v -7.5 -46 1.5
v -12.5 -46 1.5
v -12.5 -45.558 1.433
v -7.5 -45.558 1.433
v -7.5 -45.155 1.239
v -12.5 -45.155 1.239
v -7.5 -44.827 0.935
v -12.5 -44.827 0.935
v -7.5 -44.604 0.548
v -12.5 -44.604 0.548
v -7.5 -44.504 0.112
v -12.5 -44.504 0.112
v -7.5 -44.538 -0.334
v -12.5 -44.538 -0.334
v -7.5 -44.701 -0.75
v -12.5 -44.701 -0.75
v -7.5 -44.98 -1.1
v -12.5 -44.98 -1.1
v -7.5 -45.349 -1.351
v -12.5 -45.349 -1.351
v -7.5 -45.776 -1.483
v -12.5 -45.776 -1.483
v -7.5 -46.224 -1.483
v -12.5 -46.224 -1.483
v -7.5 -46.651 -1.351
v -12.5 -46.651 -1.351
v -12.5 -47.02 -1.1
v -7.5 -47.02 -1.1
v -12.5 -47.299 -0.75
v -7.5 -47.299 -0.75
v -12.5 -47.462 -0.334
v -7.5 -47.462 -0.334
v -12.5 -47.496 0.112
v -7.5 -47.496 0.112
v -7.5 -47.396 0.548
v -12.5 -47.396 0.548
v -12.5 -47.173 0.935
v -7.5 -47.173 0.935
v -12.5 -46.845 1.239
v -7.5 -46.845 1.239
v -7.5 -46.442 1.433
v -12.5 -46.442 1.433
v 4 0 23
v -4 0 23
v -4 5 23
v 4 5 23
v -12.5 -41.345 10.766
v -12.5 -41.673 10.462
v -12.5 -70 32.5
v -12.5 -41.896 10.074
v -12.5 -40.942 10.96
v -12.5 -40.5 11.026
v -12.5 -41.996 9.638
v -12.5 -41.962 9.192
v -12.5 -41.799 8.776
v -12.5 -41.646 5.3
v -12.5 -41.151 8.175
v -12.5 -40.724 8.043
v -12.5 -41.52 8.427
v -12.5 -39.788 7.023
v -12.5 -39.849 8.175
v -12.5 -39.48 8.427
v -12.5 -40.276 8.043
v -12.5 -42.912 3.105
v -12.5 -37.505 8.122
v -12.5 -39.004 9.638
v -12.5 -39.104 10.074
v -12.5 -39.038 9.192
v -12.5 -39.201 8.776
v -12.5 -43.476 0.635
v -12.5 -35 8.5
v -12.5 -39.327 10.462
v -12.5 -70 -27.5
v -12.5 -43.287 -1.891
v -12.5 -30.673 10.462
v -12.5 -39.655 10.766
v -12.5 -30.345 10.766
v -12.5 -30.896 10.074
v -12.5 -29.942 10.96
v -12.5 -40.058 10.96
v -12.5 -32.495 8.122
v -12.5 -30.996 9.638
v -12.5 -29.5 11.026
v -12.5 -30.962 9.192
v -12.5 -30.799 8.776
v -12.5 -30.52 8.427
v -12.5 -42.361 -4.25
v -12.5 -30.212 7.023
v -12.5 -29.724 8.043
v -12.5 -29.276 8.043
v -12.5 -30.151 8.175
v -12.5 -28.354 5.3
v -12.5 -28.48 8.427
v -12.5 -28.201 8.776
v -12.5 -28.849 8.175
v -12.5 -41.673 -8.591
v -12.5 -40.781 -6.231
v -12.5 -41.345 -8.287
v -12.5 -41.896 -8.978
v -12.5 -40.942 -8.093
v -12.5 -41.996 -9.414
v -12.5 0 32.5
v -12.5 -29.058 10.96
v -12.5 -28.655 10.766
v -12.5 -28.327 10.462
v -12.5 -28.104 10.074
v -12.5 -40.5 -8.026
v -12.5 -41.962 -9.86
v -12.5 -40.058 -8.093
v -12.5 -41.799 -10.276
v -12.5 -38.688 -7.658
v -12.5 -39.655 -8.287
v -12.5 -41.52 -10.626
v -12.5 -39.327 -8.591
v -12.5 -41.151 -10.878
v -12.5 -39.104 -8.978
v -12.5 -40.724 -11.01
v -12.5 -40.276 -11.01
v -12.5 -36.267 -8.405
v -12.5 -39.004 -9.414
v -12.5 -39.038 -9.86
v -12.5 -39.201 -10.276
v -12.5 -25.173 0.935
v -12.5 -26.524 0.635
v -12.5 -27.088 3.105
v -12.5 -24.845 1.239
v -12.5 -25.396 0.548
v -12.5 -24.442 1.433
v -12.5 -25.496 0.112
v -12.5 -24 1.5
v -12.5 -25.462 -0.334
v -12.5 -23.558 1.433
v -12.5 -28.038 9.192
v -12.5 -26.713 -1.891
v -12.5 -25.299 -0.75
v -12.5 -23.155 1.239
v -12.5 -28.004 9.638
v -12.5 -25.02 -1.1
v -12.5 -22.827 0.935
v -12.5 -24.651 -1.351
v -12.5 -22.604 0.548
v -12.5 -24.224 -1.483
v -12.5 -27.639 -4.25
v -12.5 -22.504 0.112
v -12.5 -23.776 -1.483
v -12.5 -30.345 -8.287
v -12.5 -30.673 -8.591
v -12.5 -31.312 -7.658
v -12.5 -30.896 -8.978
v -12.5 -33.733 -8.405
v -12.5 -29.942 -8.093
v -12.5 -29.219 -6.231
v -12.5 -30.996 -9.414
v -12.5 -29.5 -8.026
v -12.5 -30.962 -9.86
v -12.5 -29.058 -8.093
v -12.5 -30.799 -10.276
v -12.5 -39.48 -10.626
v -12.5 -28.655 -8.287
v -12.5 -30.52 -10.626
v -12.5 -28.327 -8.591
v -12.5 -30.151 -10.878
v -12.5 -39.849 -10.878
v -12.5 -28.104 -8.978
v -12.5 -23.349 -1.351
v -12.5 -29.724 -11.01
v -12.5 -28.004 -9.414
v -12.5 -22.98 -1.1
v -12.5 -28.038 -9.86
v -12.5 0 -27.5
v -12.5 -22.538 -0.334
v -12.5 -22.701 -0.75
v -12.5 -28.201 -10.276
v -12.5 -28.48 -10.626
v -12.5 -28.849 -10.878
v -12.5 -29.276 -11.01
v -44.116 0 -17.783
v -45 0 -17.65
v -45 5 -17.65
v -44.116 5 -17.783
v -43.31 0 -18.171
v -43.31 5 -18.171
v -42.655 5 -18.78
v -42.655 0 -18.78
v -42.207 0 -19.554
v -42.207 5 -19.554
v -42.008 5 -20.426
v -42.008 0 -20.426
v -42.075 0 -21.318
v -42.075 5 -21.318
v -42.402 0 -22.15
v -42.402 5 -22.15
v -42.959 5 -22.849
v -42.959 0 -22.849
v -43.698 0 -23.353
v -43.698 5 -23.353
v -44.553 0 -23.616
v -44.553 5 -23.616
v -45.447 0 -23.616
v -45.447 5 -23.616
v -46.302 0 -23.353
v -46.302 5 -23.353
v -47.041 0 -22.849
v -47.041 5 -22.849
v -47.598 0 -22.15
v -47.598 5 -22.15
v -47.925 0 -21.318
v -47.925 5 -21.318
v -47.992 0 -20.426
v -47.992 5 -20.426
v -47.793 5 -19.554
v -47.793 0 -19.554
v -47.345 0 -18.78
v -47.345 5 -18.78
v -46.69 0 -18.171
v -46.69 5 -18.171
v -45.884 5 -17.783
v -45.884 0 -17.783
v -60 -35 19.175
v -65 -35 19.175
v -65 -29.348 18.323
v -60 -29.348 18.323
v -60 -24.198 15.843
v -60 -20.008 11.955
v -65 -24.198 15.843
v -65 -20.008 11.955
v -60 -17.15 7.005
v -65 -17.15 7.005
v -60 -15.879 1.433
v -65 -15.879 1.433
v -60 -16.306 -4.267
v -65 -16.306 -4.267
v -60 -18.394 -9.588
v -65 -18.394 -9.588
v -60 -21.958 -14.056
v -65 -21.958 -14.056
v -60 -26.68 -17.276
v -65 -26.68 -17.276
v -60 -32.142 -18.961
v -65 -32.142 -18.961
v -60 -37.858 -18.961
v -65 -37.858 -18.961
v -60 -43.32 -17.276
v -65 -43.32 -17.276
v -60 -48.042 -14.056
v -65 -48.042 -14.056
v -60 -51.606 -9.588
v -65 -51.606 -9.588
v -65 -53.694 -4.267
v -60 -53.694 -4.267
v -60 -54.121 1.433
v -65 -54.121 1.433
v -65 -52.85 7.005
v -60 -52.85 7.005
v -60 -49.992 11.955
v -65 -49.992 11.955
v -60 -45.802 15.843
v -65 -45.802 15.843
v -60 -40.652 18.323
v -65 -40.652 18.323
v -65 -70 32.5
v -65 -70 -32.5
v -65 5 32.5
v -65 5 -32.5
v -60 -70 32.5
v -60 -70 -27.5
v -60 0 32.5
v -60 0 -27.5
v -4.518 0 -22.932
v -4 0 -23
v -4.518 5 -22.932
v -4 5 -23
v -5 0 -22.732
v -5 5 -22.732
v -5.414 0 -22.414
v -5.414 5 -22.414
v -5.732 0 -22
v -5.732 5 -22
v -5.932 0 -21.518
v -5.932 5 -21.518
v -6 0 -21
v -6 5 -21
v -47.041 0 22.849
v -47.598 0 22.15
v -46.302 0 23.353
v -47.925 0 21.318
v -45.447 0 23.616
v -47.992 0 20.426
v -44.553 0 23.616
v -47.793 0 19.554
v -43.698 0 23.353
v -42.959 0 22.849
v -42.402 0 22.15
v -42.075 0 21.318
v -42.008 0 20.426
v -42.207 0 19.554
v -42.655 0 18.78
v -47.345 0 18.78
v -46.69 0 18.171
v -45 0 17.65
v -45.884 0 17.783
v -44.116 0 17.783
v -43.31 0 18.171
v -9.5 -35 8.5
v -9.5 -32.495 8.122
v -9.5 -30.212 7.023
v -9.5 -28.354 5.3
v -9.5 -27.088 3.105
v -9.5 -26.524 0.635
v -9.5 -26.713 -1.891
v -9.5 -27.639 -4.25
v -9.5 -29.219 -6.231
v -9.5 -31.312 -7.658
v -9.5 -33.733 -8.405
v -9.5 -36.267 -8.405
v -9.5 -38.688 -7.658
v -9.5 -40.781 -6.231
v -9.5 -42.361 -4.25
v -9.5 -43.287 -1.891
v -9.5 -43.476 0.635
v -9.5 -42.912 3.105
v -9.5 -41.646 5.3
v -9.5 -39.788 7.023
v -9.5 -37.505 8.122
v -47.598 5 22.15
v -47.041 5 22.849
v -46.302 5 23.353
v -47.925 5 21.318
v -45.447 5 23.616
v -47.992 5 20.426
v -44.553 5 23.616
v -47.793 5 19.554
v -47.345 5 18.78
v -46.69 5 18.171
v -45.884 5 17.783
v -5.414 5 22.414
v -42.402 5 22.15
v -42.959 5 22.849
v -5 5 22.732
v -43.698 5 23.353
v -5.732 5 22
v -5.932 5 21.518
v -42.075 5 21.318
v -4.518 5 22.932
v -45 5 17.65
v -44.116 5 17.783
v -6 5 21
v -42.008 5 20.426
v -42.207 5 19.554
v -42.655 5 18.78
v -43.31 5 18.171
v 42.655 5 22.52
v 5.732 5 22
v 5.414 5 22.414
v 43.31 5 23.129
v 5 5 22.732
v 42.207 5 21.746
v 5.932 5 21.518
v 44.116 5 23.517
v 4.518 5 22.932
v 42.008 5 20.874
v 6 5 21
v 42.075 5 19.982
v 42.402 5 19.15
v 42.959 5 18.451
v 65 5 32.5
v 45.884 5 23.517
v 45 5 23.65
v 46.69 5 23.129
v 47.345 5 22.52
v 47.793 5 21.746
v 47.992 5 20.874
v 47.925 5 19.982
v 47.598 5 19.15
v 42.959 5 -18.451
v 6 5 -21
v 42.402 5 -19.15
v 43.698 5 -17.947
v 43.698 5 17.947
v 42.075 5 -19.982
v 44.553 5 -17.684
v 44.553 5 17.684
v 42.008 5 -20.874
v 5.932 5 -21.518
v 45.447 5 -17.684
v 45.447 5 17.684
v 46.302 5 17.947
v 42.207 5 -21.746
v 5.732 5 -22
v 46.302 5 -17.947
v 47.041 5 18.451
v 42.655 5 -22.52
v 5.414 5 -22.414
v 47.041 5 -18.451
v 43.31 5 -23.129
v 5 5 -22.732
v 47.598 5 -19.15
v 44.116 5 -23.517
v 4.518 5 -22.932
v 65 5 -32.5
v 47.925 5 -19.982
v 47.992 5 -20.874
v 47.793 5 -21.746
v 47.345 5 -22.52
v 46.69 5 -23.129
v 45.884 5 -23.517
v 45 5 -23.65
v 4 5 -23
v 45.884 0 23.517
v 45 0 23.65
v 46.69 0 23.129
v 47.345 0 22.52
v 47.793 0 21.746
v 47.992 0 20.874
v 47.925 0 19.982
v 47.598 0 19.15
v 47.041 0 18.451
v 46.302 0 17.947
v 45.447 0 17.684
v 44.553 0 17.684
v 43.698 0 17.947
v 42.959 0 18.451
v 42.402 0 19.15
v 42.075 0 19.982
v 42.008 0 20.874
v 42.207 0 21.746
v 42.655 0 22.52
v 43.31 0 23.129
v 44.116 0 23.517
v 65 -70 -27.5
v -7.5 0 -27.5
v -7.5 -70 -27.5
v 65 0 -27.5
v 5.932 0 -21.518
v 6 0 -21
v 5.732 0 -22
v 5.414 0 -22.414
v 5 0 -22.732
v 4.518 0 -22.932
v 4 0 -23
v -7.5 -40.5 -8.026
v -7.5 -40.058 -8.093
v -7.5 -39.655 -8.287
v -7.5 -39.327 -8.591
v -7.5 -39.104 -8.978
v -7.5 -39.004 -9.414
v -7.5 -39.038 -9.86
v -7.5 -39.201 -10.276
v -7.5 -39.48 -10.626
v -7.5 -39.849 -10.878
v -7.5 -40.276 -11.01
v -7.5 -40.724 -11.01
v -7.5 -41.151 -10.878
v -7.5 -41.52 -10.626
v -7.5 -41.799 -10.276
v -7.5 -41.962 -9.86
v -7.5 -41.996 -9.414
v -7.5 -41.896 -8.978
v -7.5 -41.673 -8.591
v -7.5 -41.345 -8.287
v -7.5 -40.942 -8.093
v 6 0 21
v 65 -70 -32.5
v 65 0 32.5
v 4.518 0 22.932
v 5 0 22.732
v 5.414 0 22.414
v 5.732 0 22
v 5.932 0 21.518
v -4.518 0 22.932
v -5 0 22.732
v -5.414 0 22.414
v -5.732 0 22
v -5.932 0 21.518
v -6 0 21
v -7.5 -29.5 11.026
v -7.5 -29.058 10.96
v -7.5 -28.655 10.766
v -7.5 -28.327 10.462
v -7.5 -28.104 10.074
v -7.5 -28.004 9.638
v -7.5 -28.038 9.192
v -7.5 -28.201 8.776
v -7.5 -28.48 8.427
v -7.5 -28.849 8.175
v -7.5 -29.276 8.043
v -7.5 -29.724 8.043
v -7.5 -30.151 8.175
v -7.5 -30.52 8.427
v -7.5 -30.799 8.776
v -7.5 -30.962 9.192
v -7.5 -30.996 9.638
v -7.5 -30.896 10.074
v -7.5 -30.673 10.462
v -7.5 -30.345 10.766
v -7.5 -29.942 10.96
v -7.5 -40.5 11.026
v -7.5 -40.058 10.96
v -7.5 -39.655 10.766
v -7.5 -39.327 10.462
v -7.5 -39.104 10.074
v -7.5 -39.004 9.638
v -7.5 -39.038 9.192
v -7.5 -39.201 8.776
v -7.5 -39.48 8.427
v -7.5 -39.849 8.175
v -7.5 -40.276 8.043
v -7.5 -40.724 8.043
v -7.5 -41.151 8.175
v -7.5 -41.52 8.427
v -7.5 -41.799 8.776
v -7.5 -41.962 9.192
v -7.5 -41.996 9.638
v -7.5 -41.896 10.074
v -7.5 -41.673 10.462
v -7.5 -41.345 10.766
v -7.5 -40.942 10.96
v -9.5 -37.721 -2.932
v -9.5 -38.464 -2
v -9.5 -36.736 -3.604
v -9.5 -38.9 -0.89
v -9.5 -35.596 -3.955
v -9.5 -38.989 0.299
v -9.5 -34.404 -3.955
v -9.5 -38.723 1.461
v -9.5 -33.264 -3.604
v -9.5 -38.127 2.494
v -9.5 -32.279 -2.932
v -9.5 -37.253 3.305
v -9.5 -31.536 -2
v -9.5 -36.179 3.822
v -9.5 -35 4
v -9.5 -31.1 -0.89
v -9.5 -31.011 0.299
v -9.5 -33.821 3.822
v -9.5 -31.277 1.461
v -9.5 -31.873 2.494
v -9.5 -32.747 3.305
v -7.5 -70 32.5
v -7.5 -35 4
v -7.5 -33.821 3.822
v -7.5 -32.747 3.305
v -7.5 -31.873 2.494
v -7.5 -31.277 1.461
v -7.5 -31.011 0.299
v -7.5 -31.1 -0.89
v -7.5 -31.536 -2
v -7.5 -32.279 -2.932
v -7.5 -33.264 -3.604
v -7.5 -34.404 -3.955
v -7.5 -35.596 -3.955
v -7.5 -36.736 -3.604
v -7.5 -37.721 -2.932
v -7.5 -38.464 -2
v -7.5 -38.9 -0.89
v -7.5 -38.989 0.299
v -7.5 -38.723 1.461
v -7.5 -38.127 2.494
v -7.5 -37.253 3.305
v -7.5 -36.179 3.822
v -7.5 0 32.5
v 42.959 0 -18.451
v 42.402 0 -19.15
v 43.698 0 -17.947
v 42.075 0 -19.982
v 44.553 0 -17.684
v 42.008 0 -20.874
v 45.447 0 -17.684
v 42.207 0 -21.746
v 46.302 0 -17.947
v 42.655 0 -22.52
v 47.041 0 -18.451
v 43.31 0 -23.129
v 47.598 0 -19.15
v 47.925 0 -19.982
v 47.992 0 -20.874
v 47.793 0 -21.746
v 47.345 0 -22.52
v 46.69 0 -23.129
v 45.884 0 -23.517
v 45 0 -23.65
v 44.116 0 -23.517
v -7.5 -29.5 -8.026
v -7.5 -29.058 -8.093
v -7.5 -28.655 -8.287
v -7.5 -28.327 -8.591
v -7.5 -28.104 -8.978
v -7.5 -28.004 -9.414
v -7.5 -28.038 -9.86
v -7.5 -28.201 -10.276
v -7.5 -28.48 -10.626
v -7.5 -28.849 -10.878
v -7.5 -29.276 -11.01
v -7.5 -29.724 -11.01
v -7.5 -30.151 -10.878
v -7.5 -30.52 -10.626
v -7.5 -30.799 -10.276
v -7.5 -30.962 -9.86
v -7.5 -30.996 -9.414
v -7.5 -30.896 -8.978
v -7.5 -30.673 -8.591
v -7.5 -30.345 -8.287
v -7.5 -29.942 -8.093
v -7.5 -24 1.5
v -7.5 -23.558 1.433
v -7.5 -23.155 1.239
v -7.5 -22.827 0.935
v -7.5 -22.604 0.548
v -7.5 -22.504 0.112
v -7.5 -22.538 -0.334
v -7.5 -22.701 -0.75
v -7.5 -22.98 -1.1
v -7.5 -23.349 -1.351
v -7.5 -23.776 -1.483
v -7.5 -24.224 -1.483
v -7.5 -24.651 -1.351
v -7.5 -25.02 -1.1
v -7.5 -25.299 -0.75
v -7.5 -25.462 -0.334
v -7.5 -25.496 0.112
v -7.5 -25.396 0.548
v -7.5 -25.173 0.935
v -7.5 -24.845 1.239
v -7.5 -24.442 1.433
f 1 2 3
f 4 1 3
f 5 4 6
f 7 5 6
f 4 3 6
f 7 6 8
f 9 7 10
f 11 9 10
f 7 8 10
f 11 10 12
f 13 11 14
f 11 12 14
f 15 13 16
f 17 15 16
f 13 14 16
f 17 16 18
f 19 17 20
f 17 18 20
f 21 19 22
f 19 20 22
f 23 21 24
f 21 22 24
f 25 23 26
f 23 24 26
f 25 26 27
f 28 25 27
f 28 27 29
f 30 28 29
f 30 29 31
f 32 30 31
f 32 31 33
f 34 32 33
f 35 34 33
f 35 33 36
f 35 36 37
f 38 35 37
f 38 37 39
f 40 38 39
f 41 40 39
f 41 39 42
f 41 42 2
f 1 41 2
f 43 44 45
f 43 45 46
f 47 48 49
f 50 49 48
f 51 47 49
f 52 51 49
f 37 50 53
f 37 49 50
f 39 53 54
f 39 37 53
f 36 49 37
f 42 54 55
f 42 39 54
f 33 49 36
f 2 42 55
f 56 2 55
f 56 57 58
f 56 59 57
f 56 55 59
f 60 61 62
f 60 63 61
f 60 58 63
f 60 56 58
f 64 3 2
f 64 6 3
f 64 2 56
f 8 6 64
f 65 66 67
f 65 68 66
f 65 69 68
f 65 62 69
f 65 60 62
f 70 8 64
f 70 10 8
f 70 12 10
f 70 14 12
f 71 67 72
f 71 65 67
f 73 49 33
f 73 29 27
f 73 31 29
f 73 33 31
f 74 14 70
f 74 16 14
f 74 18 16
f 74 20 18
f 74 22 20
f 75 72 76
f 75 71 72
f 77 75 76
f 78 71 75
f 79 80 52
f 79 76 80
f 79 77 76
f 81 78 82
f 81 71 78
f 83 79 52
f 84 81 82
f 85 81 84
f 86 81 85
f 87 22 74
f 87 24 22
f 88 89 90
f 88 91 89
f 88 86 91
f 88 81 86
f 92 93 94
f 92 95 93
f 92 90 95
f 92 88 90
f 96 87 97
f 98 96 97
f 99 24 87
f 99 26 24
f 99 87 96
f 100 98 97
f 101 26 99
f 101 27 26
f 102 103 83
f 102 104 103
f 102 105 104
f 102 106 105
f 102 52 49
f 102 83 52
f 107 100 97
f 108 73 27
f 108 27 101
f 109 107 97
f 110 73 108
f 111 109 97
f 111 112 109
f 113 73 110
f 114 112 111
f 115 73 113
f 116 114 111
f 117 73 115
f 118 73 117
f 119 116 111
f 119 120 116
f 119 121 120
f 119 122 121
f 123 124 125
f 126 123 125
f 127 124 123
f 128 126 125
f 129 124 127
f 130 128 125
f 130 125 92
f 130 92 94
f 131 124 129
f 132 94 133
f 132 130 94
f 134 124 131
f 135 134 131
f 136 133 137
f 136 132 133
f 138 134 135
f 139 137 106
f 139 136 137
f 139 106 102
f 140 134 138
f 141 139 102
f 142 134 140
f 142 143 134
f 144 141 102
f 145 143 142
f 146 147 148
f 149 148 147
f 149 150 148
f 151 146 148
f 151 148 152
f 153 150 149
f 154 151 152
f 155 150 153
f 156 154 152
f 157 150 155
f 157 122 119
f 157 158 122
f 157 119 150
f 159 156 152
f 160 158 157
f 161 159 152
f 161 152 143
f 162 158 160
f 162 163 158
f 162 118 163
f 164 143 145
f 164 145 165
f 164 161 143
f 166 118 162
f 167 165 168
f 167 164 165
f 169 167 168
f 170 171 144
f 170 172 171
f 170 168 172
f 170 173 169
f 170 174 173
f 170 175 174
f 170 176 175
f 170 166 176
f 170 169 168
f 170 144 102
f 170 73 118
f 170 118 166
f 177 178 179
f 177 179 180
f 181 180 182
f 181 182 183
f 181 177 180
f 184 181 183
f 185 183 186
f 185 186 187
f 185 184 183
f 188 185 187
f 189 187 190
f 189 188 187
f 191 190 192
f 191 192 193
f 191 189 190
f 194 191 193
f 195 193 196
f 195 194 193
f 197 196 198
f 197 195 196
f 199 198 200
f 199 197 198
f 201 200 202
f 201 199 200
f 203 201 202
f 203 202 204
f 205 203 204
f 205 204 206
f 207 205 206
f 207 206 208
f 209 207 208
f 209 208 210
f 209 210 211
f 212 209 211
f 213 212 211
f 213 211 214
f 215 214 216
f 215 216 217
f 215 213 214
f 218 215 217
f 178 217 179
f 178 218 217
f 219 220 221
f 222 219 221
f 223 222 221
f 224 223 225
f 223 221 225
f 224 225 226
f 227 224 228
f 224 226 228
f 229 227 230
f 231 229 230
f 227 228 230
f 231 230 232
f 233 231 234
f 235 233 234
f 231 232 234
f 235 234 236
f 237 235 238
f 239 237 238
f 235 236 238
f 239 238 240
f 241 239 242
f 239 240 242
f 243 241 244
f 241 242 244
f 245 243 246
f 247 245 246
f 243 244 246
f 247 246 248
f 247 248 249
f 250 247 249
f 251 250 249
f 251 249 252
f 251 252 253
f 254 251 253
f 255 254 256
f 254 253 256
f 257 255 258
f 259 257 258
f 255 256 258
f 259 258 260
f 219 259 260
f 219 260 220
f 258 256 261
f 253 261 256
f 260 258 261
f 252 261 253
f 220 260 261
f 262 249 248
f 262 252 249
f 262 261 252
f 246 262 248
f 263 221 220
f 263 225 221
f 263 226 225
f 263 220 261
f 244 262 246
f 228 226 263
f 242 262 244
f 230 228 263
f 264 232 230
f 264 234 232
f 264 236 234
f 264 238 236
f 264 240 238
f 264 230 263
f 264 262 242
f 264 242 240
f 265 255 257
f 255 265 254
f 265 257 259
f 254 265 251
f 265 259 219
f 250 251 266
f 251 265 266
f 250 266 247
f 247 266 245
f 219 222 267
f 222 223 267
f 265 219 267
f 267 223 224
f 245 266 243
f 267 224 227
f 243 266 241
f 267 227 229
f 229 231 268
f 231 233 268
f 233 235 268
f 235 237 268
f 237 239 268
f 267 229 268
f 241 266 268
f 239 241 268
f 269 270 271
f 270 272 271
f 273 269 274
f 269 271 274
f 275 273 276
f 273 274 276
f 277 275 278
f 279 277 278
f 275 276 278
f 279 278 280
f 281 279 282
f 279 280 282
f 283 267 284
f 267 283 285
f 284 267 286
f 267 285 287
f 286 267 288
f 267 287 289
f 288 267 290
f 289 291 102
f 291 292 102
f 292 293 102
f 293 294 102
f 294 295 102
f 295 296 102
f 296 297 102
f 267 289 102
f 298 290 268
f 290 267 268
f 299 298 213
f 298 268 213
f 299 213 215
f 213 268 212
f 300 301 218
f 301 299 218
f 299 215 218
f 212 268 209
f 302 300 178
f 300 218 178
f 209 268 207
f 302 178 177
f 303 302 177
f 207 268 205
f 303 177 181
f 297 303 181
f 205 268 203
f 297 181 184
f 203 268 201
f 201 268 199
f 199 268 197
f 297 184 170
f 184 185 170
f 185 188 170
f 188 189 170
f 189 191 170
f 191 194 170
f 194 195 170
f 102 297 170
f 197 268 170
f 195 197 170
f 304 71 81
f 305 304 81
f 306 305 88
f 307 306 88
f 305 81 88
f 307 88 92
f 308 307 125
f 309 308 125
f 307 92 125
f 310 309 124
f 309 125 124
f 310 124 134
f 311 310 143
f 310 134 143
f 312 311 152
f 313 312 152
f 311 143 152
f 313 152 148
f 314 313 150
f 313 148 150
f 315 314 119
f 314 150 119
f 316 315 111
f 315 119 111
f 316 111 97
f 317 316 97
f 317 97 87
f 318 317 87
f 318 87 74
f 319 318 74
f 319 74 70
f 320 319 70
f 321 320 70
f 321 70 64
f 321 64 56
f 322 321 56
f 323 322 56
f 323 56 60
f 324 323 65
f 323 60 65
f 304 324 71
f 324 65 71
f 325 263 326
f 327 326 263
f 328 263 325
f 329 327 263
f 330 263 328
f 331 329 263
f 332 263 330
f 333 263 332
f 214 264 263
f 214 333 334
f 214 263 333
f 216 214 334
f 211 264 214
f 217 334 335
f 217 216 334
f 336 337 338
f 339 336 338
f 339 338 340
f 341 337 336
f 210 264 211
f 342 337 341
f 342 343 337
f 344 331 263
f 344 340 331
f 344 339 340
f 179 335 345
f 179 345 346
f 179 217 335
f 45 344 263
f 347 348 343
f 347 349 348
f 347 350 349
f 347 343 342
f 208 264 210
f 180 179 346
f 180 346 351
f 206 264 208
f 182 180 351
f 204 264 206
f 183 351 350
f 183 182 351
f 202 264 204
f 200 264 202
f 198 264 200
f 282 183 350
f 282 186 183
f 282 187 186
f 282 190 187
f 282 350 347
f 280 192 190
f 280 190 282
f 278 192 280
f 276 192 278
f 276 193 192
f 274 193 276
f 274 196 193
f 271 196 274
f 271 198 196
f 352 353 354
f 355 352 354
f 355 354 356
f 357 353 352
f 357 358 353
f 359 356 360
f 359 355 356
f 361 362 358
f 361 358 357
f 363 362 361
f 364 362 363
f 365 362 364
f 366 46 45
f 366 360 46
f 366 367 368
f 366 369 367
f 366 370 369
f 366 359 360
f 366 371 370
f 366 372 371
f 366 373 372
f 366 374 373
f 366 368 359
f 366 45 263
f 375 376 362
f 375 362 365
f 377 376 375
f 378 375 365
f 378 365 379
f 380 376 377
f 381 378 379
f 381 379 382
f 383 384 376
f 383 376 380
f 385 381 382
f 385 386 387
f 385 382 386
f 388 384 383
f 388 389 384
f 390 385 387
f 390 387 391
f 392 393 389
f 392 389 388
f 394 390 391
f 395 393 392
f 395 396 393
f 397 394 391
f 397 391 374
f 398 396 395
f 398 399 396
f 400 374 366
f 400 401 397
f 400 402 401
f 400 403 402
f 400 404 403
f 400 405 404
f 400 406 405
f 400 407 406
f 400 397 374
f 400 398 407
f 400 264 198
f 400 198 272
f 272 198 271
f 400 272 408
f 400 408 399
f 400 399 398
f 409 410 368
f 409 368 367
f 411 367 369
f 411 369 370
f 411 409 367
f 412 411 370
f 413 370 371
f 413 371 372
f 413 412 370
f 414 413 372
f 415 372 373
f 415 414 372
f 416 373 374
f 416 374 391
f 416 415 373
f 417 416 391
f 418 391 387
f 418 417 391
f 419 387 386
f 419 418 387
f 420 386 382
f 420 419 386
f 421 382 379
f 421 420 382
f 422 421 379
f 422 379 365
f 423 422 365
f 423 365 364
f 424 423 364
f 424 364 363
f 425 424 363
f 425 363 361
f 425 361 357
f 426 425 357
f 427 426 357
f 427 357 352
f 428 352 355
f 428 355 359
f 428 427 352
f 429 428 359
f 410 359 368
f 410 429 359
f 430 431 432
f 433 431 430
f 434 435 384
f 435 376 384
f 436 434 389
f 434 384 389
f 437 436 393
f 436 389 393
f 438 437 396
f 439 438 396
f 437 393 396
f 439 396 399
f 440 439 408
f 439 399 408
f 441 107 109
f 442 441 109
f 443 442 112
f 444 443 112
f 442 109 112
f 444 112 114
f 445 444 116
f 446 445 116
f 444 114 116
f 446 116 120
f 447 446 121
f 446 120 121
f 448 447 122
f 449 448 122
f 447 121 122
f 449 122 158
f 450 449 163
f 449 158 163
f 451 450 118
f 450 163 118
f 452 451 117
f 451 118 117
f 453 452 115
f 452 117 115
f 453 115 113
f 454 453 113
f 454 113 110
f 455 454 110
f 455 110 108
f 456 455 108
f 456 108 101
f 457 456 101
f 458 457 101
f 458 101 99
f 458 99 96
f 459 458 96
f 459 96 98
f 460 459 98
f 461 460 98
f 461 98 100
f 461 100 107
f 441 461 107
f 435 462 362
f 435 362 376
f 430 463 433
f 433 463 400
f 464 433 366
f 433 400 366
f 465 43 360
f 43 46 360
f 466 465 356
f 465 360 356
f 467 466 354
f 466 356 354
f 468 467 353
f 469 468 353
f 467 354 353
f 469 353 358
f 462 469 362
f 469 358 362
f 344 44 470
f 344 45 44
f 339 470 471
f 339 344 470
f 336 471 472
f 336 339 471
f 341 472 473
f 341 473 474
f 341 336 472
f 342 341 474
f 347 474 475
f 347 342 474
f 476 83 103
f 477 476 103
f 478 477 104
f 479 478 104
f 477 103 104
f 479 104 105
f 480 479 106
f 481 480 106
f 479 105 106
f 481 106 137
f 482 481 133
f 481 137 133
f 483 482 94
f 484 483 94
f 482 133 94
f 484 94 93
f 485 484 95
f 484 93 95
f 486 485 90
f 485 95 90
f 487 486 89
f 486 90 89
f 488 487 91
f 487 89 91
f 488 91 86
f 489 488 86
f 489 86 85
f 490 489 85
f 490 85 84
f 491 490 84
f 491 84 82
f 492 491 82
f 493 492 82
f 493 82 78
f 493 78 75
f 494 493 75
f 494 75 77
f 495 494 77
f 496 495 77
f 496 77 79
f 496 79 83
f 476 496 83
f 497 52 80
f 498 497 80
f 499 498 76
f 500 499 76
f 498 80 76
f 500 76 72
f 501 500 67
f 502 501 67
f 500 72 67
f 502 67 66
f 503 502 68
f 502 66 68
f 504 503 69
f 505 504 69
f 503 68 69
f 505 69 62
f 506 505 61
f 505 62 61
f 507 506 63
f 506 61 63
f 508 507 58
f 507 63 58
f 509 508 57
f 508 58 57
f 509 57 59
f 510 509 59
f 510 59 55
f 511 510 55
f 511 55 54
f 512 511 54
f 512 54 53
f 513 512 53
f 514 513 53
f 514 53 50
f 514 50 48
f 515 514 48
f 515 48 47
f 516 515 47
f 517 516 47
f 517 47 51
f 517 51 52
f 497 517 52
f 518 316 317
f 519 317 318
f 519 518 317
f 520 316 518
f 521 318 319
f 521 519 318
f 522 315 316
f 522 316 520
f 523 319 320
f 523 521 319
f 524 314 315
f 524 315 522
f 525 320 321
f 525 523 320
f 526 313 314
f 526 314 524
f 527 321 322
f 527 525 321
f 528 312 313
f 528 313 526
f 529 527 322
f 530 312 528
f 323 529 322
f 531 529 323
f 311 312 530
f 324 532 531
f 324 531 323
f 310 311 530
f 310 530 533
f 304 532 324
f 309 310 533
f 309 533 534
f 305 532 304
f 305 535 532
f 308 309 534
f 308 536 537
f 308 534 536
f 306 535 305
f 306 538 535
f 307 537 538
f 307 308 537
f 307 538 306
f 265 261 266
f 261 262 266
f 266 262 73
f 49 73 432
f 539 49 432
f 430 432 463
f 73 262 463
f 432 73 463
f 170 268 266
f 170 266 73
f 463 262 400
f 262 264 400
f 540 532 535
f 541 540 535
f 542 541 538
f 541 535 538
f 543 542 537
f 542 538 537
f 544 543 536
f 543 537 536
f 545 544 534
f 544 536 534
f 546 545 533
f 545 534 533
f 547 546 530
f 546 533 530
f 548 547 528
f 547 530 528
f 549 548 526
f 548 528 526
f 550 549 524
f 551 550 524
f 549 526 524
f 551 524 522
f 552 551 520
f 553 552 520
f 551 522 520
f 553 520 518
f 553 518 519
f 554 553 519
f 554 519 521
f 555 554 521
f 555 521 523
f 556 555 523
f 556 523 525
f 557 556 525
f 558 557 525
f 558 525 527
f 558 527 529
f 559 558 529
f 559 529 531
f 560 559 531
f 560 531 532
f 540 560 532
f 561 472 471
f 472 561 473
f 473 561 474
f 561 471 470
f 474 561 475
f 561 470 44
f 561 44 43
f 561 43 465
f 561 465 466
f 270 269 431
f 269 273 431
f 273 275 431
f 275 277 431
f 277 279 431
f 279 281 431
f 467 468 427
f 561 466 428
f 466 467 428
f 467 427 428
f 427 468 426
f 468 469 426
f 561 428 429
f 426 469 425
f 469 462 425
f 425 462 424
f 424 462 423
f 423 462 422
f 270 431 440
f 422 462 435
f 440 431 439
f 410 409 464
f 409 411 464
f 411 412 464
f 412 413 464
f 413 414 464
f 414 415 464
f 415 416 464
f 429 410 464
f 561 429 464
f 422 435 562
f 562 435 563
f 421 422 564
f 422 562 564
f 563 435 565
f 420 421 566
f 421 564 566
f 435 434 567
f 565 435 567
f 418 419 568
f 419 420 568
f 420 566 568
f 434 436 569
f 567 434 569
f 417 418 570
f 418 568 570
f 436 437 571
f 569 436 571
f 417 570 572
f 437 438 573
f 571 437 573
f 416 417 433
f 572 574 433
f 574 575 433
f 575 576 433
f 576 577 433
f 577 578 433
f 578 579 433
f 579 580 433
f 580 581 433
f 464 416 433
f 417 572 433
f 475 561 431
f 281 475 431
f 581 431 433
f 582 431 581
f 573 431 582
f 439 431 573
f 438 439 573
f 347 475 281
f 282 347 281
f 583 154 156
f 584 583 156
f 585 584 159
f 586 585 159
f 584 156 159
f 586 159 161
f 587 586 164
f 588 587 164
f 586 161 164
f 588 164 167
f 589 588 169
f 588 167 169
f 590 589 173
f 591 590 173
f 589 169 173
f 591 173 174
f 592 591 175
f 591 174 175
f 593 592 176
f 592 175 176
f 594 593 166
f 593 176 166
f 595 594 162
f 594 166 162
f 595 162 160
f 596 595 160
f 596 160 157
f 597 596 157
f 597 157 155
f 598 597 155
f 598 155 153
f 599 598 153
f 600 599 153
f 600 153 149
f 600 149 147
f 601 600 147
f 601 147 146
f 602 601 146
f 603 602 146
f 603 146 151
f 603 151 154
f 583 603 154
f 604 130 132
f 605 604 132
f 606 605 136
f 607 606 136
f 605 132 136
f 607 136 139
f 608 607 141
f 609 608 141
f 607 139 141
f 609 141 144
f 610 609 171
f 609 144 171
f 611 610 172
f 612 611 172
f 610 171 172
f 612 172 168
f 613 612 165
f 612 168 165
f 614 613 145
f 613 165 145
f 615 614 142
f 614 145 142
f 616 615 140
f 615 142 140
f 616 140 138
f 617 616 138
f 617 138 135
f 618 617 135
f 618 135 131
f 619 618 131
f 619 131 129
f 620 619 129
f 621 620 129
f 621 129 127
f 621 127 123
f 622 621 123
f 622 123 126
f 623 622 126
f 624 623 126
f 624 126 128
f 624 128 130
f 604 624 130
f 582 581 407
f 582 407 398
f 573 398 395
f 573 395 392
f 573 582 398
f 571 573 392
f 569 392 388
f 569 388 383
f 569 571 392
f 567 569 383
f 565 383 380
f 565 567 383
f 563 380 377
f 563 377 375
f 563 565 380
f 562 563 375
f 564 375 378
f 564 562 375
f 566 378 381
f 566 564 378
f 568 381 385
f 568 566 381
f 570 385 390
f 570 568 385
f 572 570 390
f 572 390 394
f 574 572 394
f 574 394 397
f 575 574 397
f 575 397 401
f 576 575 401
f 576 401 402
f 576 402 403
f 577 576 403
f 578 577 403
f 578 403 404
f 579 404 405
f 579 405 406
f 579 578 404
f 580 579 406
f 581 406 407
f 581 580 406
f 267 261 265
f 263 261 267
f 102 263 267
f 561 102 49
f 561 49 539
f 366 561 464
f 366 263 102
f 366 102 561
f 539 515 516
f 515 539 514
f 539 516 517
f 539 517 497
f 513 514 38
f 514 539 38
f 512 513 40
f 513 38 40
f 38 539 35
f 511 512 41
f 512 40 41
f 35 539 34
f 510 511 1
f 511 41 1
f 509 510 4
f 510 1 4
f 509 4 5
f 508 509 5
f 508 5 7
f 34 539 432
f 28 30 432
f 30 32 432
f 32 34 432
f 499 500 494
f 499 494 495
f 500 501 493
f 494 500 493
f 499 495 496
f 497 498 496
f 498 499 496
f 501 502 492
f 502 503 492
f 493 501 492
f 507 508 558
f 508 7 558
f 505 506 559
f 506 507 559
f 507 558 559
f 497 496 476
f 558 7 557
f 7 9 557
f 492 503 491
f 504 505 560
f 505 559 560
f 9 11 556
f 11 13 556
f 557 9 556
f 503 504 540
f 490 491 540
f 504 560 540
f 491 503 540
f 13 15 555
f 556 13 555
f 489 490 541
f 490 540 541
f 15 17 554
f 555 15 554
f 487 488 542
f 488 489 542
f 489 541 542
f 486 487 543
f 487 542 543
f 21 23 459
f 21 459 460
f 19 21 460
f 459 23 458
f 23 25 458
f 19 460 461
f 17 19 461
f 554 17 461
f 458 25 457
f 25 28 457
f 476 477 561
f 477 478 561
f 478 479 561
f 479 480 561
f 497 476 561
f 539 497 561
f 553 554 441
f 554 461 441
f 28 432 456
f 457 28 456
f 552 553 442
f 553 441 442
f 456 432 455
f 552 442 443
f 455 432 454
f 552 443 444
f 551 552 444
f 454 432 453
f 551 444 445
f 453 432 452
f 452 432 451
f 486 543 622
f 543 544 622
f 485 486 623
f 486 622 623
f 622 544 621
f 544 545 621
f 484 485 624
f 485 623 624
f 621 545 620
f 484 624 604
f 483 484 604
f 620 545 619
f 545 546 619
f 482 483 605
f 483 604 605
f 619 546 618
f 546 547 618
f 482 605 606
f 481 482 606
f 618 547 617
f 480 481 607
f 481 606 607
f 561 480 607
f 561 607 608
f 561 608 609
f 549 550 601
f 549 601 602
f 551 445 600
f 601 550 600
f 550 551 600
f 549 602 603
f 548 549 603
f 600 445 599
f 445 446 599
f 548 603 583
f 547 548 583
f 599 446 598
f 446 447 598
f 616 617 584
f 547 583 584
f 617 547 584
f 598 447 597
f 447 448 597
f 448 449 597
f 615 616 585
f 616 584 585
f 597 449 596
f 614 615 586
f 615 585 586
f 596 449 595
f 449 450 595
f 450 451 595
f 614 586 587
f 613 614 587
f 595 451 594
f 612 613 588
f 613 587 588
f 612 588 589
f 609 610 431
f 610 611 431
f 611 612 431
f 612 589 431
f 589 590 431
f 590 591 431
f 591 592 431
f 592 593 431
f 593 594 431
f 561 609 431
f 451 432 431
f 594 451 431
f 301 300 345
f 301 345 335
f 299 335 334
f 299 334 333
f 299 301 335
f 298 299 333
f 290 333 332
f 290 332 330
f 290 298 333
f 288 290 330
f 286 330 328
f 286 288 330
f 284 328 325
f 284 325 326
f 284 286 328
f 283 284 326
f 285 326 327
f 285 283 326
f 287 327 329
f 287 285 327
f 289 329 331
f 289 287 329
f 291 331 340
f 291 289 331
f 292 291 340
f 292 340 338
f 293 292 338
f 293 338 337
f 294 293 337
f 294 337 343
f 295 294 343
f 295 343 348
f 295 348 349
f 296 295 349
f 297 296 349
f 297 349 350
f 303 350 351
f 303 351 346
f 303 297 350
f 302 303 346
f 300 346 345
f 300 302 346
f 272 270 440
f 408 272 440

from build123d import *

# Parameters (mm, degrees)
SKETCH1_W           = 130
SKETCH1_H           = 65
SKETCH1_R           = 3
SKETCH1_W_2         = 12
SKETCH1_H_2         = 46
BOSS_EXTRUDE1_DEPTH = 5
FILLET1_R           = 2
SKETCH2_W           = 130
SKETCH2_H           = 5
BOSS_EXTRUDE2_DEPTH = 70
SKETCH3_W           = 5
SKETCH3_H           = 70
BOSS_EXTRUDE3_DEPTH = 60
SKETCH4_R           = 4
SKETCH4_R_2         = 1.5
CUT_EXTRUDE1_DEPTH  = 10
SKETCH5_R           = 8.5
CUT_EXTRUDE2_DEPTH  = 3
SKETCH6_W           = 5
SKETCH6_H           = 70
BOSS_EXTRUDE4_DEPTH = 60
SKETCH7_R           = 19.175
CUT_EXTRUDE3_DEPTH  = 5


with BuildPart() as part:
    # Sketch1 → Boss-Extrude1 (new body)
    with BuildSketch(Plane(origin=(0, 0, 0), x_dir=(1, 0, 0), z_dir=(0, 1, 0))):
        Rectangle(SKETCH1_W, SKETCH1_H)
        with Locations(Location((-45, 20.65, 0), (0, 0, 270))):
            Circle(SKETCH1_R, mode=Mode.SUBTRACT)
        with Locations(Location((-45, -20.65, 0), (0, 0, 90))):
            Circle(SKETCH1_R, mode=Mode.SUBTRACT)
        with Locations(Location((45, 20.65, 0), (0, 0, 90))):
            Circle(SKETCH1_R, mode=Mode.SUBTRACT)
        with Locations(Location((45, -20.65, 0), (0, 0, 270))):
            Circle(SKETCH1_R, mode=Mode.SUBTRACT)
        Rectangle(SKETCH1_W_2, SKETCH1_H_2, mode=Mode.SUBTRACT)
    extrude(amount=BOSS_EXTRUDE1_DEPTH)

    # Fillet1
    fillet1_edges = [part.edges().sort_by_distance(p)[0] for p in [
        (-6, 2.5, -23),
        (-6, 2.5, 23),
        (6, 2.5, 23),
        (6, 2.5, -23),
    ]]
    fillet(fillet1_edges, radius=FILLET1_R)

    # Sketch2 → Boss-Extrude2 (add)
    with BuildSketch(Plane.XZ):
        with Locations((0, -30)):
            Rectangle(SKETCH2_W, SKETCH2_H)
    extrude(amount=BOSS_EXTRUDE2_DEPTH)

    # Sketch3 → Boss-Extrude3 (add)
    with BuildSketch(Plane.XY.offset(-27.5)):
        with Locations((-10, -35)):
            Rectangle(SKETCH3_W, SKETCH3_H)
    extrude(amount=BOSS_EXTRUDE3_DEPTH)

    # Sketch4 → Cut-Extrude1 (cut)
    with BuildSketch(Plane.ZY.offset(12.5)):
        with Locations((0, -35)):
            Circle(SKETCH4_R)
        with Locations((0, -24)):
            Circle(SKETCH4_R_2)
        with Locations((-9.526279442, -29.5)):
            Circle(SKETCH4_R_2)
        with Locations((-9.526279442, -40.5)):
            Circle(SKETCH4_R_2)
        with Locations((0, -46)):
            Circle(SKETCH4_R_2)
        with Locations((9.526279442, -40.5)):
            Circle(SKETCH4_R_2)
        with Locations((9.526279442, -29.5)):
            Circle(SKETCH4_R_2)
    extrude(amount=-CUT_EXTRUDE1_DEPTH, mode=Mode.SUBTRACT)

    # Sketch5 → Cut-Extrude2 (cut)
    with BuildSketch(Plane.ZY.offset(12.5)):
        with Locations((0, -35)):
            Circle(SKETCH5_R)
    extrude(amount=-CUT_EXTRUDE2_DEPTH, mode=Mode.SUBTRACT)

    # Sketch6 → Boss-Extrude4 (add)
    with BuildSketch(Plane.XY.offset(-27.5)):
        with Locations((-62.5, -35)):
            Rectangle(SKETCH6_W, SKETCH6_H)
    extrude(amount=BOSS_EXTRUDE4_DEPTH)

    # Sketch7 → Cut-Extrude3 (cut)
    with BuildSketch(Plane.ZY.offset(65)):
        with Locations((0, -35)):
            Circle(SKETCH7_R)
    extrude(amount=-CUT_EXTRUDE3_DEPTH, mode=Mode.SUBTRACT)


solid = part.part
